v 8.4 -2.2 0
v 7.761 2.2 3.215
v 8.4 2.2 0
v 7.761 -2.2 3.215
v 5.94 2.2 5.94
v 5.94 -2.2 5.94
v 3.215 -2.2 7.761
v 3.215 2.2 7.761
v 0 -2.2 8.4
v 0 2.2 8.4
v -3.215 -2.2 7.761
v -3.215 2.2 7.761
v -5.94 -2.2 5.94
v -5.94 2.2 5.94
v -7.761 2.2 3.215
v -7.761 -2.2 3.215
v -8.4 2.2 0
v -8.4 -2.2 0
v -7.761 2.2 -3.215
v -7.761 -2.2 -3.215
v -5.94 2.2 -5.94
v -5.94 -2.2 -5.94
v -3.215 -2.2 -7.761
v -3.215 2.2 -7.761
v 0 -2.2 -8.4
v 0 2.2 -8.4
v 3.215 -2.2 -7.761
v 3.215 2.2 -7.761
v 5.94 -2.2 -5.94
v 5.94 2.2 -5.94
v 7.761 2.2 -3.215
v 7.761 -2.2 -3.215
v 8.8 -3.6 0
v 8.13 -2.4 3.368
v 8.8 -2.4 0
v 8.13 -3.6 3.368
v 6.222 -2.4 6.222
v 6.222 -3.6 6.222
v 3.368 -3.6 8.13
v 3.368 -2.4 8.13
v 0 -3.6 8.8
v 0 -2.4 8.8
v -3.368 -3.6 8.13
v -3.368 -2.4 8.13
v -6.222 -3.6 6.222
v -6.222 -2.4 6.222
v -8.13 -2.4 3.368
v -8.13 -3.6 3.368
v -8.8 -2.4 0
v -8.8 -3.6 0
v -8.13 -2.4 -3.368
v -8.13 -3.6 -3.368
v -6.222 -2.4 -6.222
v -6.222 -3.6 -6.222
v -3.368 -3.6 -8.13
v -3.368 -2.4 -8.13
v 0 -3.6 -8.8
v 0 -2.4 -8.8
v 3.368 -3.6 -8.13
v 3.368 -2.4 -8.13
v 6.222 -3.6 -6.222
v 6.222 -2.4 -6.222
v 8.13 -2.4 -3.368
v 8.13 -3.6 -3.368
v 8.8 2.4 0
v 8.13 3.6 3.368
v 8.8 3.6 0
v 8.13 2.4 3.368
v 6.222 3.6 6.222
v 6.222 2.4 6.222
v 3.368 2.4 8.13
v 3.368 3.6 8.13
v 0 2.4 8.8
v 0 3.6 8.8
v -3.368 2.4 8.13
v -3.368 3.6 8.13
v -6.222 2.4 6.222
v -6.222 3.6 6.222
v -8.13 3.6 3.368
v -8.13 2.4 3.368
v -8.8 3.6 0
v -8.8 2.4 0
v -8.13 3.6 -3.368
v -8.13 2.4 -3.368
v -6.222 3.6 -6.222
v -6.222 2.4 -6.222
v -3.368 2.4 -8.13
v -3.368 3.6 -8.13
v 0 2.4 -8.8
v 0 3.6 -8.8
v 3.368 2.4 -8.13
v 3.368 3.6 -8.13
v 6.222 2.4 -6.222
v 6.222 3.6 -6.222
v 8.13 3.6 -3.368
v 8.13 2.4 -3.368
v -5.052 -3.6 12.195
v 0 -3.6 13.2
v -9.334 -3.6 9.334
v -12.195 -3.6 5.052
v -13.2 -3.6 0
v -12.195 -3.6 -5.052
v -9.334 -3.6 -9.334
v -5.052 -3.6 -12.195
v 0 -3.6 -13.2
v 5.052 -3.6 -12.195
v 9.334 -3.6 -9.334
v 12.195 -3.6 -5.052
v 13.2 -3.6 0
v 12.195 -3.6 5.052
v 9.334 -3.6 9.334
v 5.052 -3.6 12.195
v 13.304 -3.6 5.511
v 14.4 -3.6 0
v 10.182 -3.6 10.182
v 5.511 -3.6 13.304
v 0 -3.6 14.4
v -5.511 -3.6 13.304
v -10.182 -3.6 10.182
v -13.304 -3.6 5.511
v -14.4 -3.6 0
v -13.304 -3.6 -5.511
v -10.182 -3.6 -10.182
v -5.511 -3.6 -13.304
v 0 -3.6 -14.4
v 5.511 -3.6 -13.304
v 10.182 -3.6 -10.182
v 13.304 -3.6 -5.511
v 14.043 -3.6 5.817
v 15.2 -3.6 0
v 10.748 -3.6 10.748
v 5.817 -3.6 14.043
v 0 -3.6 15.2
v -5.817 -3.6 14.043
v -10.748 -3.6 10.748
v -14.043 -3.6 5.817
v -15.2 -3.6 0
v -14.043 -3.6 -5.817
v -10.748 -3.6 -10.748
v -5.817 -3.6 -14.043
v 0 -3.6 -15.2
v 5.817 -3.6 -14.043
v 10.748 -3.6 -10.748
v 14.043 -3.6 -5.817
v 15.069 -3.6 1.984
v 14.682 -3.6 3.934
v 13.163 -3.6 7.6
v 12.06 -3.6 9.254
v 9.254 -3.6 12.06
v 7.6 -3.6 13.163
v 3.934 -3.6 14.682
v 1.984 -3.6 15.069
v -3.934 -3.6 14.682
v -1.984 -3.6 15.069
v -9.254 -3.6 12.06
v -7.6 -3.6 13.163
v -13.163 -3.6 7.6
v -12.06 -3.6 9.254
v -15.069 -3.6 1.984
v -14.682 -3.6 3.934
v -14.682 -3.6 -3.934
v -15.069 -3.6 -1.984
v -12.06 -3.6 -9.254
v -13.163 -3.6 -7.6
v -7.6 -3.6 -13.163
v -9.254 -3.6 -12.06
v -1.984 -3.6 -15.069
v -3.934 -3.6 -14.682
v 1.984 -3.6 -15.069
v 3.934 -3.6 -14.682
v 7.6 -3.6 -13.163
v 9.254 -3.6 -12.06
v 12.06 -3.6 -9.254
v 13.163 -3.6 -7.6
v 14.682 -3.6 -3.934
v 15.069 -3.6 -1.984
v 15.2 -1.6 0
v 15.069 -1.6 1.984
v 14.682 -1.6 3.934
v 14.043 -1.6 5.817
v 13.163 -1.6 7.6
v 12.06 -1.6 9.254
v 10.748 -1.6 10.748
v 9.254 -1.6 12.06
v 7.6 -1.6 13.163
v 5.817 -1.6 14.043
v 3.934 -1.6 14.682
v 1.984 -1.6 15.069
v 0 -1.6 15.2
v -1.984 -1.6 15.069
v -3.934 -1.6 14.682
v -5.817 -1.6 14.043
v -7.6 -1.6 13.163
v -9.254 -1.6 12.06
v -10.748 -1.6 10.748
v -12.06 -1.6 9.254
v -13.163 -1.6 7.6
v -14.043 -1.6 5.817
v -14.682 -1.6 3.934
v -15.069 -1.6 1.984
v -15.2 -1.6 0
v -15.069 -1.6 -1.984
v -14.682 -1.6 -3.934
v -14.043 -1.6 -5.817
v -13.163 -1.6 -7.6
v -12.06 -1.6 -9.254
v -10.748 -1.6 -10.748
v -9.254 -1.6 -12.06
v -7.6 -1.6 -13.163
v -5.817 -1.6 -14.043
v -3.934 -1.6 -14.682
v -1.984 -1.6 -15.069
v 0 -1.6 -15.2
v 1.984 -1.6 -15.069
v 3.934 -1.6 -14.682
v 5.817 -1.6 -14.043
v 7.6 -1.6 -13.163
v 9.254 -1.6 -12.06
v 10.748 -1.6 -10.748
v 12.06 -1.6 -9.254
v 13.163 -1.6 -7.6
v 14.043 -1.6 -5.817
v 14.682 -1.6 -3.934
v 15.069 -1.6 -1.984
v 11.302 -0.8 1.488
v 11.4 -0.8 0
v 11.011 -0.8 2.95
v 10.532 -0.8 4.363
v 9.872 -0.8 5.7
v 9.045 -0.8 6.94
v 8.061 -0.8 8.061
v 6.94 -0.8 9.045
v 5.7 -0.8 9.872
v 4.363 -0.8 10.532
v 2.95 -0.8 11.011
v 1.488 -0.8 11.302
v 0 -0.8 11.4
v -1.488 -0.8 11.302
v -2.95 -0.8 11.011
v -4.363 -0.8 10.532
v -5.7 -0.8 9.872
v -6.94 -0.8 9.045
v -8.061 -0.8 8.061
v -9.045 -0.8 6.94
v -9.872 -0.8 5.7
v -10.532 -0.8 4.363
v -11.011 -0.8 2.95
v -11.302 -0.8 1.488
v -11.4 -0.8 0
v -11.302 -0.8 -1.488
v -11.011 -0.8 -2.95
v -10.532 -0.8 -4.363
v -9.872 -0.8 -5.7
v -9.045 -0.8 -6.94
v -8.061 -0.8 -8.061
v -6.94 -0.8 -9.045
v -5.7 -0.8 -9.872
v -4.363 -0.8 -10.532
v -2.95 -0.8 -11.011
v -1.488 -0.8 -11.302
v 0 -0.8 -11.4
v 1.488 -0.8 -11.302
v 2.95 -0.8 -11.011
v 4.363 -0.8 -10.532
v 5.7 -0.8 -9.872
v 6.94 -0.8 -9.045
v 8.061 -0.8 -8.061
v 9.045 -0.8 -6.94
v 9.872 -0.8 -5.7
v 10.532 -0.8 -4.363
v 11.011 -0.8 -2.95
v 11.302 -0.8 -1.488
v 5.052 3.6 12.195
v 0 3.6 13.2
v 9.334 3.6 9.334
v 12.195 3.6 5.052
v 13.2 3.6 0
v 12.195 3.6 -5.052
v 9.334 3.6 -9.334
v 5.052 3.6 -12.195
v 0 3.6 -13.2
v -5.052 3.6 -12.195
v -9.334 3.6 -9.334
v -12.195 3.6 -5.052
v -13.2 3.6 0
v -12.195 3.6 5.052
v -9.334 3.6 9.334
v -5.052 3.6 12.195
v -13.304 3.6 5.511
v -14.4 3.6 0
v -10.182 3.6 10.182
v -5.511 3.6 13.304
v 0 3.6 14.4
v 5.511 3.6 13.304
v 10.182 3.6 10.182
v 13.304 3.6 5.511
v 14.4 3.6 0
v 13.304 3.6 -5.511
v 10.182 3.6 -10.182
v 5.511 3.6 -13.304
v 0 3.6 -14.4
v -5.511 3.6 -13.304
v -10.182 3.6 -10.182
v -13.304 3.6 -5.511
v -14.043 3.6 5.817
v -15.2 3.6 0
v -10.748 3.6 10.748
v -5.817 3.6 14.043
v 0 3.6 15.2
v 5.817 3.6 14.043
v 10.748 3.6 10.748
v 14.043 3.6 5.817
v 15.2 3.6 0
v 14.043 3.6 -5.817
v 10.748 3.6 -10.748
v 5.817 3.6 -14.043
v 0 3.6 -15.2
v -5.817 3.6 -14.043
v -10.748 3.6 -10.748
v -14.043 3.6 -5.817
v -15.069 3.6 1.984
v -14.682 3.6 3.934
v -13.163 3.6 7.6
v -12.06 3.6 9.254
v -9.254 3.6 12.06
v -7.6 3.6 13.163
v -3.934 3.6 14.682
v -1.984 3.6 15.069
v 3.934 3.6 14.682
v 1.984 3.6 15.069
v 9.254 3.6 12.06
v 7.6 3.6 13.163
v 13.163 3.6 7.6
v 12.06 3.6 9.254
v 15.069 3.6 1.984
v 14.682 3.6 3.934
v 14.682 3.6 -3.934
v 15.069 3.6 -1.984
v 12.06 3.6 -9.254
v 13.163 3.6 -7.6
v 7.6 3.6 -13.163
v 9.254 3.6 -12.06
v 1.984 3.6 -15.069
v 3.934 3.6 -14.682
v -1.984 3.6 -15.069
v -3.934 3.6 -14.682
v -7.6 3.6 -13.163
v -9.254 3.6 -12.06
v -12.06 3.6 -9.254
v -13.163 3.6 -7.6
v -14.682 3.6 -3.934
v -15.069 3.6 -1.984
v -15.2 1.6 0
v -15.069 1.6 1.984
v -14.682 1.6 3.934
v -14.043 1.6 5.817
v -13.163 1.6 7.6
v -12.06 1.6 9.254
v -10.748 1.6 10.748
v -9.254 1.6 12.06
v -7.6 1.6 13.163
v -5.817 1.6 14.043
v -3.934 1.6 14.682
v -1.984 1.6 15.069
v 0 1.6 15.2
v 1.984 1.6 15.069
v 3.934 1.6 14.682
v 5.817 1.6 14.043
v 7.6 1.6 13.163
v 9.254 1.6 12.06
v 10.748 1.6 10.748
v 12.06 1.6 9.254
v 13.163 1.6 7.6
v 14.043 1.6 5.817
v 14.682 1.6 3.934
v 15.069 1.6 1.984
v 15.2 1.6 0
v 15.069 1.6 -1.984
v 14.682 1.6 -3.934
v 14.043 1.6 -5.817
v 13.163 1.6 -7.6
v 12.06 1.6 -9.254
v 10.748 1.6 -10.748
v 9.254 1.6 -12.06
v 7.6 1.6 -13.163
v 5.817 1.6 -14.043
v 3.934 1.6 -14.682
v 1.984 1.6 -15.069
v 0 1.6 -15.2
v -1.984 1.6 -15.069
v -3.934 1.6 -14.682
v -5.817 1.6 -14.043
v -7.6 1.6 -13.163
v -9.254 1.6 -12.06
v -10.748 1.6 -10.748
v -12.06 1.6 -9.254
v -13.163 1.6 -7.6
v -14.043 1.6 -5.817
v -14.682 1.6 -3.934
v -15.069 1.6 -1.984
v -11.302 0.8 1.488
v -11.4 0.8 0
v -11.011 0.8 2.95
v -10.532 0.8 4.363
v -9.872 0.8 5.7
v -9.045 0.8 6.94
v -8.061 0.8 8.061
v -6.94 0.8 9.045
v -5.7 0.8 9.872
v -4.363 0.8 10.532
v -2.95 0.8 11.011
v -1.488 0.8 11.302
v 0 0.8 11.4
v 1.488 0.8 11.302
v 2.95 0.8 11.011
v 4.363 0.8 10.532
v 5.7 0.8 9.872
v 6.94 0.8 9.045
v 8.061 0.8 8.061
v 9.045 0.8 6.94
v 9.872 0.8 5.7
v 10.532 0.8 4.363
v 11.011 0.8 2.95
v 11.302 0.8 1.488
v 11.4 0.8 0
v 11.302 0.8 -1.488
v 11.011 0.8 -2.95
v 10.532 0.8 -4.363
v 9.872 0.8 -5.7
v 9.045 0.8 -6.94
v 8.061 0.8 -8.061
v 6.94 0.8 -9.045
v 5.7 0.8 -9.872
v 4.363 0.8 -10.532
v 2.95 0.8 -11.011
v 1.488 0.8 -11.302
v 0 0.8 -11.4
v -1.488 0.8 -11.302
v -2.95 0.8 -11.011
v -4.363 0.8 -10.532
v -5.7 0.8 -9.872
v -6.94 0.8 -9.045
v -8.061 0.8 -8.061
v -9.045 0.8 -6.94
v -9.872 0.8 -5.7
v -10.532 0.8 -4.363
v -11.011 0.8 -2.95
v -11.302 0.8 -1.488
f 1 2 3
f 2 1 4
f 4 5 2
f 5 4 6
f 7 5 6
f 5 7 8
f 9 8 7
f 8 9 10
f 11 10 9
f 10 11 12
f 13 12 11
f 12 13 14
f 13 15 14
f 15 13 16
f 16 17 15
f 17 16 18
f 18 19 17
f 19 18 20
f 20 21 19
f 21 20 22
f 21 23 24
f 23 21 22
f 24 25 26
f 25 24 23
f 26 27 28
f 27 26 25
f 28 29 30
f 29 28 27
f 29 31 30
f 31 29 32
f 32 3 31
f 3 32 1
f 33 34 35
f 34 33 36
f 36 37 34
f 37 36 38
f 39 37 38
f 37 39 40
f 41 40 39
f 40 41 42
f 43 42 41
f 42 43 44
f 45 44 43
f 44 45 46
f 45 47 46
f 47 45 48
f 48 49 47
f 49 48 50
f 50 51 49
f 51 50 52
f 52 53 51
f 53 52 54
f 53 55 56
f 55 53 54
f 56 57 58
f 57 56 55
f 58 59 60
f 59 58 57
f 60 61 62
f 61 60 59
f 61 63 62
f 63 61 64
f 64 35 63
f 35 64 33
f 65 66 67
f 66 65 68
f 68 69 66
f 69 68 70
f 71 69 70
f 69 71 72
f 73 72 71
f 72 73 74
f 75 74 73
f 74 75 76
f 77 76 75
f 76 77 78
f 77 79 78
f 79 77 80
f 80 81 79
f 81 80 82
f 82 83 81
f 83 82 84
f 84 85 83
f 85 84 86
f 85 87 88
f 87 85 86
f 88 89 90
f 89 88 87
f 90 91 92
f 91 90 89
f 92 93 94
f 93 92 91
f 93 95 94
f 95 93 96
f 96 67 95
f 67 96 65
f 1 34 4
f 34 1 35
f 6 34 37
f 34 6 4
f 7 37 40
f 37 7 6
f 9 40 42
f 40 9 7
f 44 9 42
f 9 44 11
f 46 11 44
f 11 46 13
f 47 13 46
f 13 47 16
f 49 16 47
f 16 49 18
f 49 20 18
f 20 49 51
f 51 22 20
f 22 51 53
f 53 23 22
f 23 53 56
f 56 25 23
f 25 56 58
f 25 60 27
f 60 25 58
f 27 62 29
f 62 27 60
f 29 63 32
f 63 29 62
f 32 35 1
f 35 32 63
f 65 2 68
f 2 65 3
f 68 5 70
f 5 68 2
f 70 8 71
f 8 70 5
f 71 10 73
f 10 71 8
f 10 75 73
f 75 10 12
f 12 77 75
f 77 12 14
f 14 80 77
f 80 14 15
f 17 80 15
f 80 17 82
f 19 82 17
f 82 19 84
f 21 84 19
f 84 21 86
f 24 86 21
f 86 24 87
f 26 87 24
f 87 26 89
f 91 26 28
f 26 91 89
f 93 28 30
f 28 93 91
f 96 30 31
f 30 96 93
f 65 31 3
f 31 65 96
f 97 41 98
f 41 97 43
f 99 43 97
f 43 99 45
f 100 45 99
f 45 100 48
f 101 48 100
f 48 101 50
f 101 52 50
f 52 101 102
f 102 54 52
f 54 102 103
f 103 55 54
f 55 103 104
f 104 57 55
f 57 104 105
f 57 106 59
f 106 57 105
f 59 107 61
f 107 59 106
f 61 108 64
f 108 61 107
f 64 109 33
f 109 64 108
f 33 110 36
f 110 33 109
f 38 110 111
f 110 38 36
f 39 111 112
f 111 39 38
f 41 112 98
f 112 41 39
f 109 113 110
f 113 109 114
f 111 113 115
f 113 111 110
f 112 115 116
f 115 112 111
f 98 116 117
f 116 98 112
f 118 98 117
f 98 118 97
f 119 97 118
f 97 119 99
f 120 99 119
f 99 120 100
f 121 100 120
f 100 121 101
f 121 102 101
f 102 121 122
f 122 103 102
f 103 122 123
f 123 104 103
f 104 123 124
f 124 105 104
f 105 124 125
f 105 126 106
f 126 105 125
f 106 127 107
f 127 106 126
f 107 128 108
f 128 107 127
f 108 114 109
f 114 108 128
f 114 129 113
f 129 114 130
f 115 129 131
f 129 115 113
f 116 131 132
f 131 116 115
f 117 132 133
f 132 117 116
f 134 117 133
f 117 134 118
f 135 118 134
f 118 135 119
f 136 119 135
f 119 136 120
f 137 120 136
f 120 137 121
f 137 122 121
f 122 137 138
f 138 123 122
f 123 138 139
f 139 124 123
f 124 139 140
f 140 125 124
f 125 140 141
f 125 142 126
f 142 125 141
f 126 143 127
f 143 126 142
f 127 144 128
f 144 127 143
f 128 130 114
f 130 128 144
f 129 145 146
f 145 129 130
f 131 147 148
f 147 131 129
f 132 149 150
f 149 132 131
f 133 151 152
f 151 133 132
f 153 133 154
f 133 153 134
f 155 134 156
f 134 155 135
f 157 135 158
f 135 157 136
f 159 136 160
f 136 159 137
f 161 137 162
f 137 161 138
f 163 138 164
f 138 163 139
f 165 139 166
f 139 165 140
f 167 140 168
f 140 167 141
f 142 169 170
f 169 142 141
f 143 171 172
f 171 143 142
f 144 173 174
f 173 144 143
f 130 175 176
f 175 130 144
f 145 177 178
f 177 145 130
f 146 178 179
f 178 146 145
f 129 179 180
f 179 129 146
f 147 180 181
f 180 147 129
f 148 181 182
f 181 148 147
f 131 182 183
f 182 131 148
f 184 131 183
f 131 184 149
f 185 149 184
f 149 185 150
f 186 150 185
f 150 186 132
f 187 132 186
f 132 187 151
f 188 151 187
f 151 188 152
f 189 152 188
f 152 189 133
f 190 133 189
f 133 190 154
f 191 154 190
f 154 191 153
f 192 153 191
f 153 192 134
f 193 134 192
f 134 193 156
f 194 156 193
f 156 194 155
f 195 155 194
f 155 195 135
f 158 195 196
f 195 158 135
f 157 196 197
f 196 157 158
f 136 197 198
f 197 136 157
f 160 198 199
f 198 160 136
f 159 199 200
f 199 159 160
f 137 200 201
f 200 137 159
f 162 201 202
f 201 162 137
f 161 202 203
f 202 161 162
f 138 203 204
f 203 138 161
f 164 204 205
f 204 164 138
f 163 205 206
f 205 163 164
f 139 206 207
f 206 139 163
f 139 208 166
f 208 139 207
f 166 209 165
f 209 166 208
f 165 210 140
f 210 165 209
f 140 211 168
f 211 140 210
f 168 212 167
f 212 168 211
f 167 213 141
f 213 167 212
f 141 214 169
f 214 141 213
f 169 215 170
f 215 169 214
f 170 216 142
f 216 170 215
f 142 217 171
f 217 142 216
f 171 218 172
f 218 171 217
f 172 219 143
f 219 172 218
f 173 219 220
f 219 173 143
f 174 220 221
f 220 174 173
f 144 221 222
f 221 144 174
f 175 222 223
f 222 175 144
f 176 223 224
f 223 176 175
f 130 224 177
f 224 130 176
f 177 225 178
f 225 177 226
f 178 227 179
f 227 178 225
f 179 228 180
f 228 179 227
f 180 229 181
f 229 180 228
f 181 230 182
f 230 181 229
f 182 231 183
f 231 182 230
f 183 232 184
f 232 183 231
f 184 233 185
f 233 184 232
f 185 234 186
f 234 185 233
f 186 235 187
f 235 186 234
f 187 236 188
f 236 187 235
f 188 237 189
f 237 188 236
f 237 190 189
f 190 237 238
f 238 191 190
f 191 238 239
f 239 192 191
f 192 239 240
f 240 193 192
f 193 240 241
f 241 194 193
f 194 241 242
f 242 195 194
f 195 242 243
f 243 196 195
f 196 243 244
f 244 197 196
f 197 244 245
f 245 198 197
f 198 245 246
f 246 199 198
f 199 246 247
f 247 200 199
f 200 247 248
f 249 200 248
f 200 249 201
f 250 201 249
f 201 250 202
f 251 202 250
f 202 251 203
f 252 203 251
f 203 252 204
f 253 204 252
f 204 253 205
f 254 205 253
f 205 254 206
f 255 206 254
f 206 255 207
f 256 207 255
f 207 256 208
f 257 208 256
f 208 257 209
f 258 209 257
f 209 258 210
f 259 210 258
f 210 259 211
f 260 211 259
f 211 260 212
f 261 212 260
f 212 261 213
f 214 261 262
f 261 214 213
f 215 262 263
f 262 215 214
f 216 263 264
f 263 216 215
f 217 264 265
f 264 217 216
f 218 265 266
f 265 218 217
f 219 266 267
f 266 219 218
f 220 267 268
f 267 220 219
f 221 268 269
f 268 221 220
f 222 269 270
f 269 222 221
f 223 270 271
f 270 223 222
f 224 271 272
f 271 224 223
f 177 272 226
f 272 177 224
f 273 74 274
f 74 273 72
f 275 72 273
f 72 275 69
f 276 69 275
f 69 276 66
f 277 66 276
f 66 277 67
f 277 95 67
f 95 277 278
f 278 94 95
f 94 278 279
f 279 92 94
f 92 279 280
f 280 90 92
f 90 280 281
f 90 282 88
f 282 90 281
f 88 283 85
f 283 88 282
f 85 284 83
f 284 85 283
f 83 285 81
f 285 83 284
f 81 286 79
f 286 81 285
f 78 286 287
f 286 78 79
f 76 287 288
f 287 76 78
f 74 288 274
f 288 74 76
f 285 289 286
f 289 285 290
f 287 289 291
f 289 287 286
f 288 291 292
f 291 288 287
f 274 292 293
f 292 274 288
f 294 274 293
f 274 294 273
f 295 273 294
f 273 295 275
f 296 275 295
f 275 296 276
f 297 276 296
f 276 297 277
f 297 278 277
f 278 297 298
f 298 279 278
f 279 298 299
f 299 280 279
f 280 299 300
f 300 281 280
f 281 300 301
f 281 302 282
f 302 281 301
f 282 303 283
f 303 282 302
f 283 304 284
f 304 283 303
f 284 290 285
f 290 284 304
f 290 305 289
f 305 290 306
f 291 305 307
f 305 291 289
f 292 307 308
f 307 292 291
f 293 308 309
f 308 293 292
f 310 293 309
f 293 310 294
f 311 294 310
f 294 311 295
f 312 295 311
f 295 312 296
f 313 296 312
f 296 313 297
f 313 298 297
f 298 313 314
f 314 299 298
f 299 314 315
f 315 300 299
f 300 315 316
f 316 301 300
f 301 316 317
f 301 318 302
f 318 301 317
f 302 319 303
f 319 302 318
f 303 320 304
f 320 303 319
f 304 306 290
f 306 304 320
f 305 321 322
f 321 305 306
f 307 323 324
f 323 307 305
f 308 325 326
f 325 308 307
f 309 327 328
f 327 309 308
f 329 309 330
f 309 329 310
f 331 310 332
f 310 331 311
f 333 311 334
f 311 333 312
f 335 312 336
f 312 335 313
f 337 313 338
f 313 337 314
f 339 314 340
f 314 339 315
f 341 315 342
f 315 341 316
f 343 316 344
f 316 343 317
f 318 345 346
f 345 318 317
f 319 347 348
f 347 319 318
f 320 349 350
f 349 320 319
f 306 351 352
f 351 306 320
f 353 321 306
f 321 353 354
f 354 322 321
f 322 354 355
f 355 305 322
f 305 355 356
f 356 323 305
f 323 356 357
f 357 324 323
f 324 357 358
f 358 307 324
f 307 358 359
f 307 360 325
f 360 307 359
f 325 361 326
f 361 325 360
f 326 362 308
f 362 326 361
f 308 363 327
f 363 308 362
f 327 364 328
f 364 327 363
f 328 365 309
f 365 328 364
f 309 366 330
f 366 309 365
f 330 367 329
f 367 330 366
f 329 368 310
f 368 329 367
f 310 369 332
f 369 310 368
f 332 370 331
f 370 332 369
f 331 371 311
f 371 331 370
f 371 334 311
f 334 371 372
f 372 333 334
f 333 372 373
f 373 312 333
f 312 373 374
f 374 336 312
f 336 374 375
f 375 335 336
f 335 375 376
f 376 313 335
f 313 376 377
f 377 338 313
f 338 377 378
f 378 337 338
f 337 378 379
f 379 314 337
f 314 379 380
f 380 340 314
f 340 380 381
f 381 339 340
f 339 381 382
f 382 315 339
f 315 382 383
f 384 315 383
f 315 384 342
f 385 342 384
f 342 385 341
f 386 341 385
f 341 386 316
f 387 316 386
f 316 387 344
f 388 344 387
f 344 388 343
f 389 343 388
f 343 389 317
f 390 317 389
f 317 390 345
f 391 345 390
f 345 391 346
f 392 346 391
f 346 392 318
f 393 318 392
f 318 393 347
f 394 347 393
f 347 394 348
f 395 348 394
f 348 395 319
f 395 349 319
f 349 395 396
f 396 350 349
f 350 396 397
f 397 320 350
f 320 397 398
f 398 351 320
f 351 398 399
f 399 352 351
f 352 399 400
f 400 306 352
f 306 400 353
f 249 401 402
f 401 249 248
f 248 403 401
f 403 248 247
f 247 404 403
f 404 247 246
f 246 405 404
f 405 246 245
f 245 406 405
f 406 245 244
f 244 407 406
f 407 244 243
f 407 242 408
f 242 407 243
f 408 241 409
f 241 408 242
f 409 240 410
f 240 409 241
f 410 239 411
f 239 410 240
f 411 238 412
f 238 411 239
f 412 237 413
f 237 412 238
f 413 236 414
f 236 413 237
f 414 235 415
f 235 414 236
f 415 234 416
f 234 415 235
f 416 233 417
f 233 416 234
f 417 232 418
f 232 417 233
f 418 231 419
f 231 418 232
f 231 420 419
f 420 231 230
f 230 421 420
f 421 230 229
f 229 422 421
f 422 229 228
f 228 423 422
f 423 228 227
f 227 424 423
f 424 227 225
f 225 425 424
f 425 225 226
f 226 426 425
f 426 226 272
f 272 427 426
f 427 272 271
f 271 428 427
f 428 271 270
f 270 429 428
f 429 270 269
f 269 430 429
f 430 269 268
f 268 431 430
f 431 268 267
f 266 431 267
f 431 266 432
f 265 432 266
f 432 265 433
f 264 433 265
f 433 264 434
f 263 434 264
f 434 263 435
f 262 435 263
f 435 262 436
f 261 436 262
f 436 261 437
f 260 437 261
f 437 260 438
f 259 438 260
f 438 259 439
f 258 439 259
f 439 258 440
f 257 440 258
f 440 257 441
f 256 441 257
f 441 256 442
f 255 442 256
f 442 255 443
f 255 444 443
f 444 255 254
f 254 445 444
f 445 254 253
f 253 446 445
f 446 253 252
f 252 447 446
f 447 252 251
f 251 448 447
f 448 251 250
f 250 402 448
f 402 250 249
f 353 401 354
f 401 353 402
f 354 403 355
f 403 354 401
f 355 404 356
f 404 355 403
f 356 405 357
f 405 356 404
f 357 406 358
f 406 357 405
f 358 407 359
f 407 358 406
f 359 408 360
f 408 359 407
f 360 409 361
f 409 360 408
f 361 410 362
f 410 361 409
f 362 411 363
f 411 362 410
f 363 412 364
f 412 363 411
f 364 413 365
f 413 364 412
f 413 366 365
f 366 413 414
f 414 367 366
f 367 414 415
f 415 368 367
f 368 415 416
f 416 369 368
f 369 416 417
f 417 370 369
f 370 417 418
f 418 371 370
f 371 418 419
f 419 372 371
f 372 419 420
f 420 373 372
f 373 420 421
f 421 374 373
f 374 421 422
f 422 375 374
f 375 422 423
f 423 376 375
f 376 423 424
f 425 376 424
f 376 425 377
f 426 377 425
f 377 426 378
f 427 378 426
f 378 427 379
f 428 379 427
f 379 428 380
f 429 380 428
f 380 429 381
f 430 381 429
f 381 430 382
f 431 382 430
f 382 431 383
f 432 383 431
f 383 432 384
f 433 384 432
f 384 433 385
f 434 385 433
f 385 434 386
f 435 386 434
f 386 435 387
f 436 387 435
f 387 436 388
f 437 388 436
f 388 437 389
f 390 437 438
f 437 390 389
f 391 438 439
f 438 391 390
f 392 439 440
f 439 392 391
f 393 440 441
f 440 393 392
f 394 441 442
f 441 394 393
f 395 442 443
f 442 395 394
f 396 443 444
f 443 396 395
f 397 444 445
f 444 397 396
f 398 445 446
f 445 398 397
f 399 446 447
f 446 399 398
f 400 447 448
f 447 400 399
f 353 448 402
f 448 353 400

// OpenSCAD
use <../lib.scad>
use <../p/4-4con21.scad>
use <../p/4-4cylo.scad>
use <../p/4-4rin11.scad>
use <../p/4-4rin18.scad>
use <../p/4-4ring2.scad>
use <../p/48/4-4aring.scad>
use <../p/48/4-4con3.scad>
use <../p/48/4-4cyli.scad>
use <../p/48/4-4edge.scad>
function ldraw_lib__44799() = [
// 0 Tyre  7/ 86 x 17 with Centre Groove
// 0 Name: 44799.dat
// 0 Author: Philippe Hurbain [Philo]
// 0 !LDRAW_ORG Part UPDATE 2014-01
// 0 !LICENSE Licensed under CC BY 2.0 and CC BY 4.0 : see CAreadme.txt
// 
// 0 BFC CERTIFY CCW
  [0,"BFC","CERTIFY"],
  [0,"BFC","CCW"],
// 
// 0 !KEYWORDS Motion Madness, Pulley, Rubber, set 4090
// 
// 0 !HISTORY 2012-08-09 [PTadmin] Official Update 2012-02
// 0 !HISTORY 2014-03-10 [cwdee] Correct description
// 0 !HISTORY 2014-06-21 [PTadmin] Official Update 2014-01
// 
// 
// 0 // Nomenclature: width_(mm)/profile_as_percentage_of_width x rim_diameter_(mm)
// 
// 0 BFC INVERTNEXT
  [0,"BFC","INVERTNEXT"],
// 1 16 0 0 -5.5 21 0 0 0 0 -21 0 11 0 4-4cylo.dat
  [1,16,0,0,-5.5,21,0,0,0,0,-21,0,11,0, ldraw_lib__4_4cylo()],
// 0 BFC INVERTNEXT
  [0,"BFC","INVERTNEXT"],
// 1 16 0 0 -9 22 0 0 0 0 -22 0 3 0 4-4cylo.dat
  [1,16,0,0,-9,22,0,0,0,0,-22,0,3,0, ldraw_lib__4_4cylo()],
// 0 BFC INVERTNEXT
  [0,"BFC","INVERTNEXT"],
// 1 16 0 0 6 22 0 0 0 0 -22 0 3 0 4-4cylo.dat
  [1,16,0,0,6,22,0,0,0,0,-22,0,3,0, ldraw_lib__4_4cylo()],
// 0 BFC INVERTNEXT
  [0,"BFC","INVERTNEXT"],
// 1 16 0 0 -6 1 0 0 0 0 -1 0 0.5 0 4-4con21.dat
  [1,16,0,0,-6,1,0,0,0,0,-1,0,0.5,0, ldraw_lib__4_4con21()],
// 0 BFC INVERTNEXT
  [0,"BFC","INVERTNEXT"],
// 1 16 0 0 6 1 0 0 0 0 -1 0 -0.5 0 4-4con21.dat
  [1,16,0,0,6,1,0,0,0,0,-1,0,-0.5,0, ldraw_lib__4_4con21()],
// 1 16 0 0 -9 11 0 0 0 0 -11 0 1 0 4-4ring2.dat
  [1,16,0,0,-9,11,0,0,0,0,-11,0,1,0, ldraw_lib__4_4ring2()],
// 1 16 0 0 -9 3 0 0 0 0 -3 0 1 0 4-4rin11.dat
  [1,16,0,0,-9,3,0,0,0,0,-3,0,1,0, ldraw_lib__4_4rin11()],
// 1 16 0 0 -9 2 0 0 0 0 -2 0 1 0 4-4rin18.dat
  [1,16,0,0,-9,2,0,0,0,0,-2,0,1,0, ldraw_lib__4_4rin18()],
// 1 16 0 0 -9 38 0 0 0 0 -38 0 1 0 48\4-4aring.dat
  [1,16,0,0,-9,38,0,0,0,0,-38,0,1,0, ldraw_lib__48__4_4aring()],
// 1 16 0 0 -9 38 0 0 0 0 -38 0 1 0 48\4-4edge.dat
  [1,16,0,0,-9,38,0,0,0,0,-38,0,1,0, ldraw_lib__48__4_4edge()],
// 1 16 0 0 -9 38 0 0 0 0 -38 0 5 0 48\4-4cyli.dat
  [1,16,0,0,-9,38,0,0,0,0,-38,0,5,0, ldraw_lib__48__4_4cyli()],
// 1 16 0 0 -4 38 0 0 0 0 -38 0 1 0 48\4-4edge.dat
  [1,16,0,0,-4,38,0,0,0,0,-38,0,1,0, ldraw_lib__48__4_4edge()],
// 1 16 0 0 -2 28.5 0 0 0 0 -28.5 0 1 0 48\4-4edge.dat
  [1,16,0,0,-2,28.5,0,0,0,0,-28.5,0,1,0, ldraw_lib__48__4_4edge()],
// 1 16 0 0 -4 9.5 0 0 0 0 -9.5 0 2 0 48\4-4con3.dat
  [1,16,0,0,-4,9.5,0,0,0,0,-9.5,0,2,0, ldraw_lib__48__4_4con3()],
// 1 16 0 0 9 -11 0 0 0 0 -11 0 -1 0 4-4ring2.dat
  [1,16,0,0,9,-11,0,0,0,0,-11,0,-1,0, ldraw_lib__4_4ring2()],
// 1 16 0 0 9 -3 0 0 0 0 -3 0 -1 0 4-4rin11.dat
  [1,16,0,0,9,-3,0,0,0,0,-3,0,-1,0, ldraw_lib__4_4rin11()],
// 1 16 0 0 9 -2 0 0 0 0 -2 0 -1 0 4-4rin18.dat
  [1,16,0,0,9,-2,0,0,0,0,-2,0,-1,0, ldraw_lib__4_4rin18()],
// 1 16 0 0 9 -38 0 0 0 0 -38 0 -1 0 48\4-4aring.dat
  [1,16,0,0,9,-38,0,0,0,0,-38,0,-1,0, ldraw_lib__48__4_4aring()],
// 1 16 0 0 9 -38 0 0 0 0 -38 0 -1 0 48\4-4edge.dat
  [1,16,0,0,9,-38,0,0,0,0,-38,0,-1,0, ldraw_lib__48__4_4edge()],
// 1 16 0 0 9 -38 0 0 0 0 -38 0 -5 0 48\4-4cyli.dat
  [1,16,0,0,9,-38,0,0,0,0,-38,0,-5,0, ldraw_lib__48__4_4cyli()],
// 1 16 0 0 4 -38 0 0 0 0 -38 0 -1 0 48\4-4edge.dat
  [1,16,0,0,4,-38,0,0,0,0,-38,0,-1,0, ldraw_lib__48__4_4edge()],
// 1 16 0 0 2 -28.5 0 0 0 0 -28.5 0 -1 0 48\4-4edge.dat
  [1,16,0,0,2,-28.5,0,0,0,0,-28.5,0,-1,0, ldraw_lib__48__4_4edge()],
// 1 16 0 0 2 -28.5 0 0 0 0 -28.5 0 -4 0 48\4-4cyli.dat
  [1,16,0,0,2,-28.5,0,0,0,0,-28.5,0,-4,0, ldraw_lib__48__4_4cyli()],
// 1 16 0 0 4 -9.5 0 0 0 0 -9.5 0 -2 0 48\4-4con3.dat
  [1,16,0,0,4,-9.5,0,0,0,0,-9.5,0,-2,0, ldraw_lib__48__4_4con3()],
// 0 //
];
module ldraw_lib__44799(step=0, col=false, unit=2/5, alt=false, line=0.2, solid=!$preview)
    makepoly(ldraw_lib__44799(), step=step, col=col, unit=unit, alt=alt, line=line, solid=solid);
ldraw_lib__44799(line=0.2);
